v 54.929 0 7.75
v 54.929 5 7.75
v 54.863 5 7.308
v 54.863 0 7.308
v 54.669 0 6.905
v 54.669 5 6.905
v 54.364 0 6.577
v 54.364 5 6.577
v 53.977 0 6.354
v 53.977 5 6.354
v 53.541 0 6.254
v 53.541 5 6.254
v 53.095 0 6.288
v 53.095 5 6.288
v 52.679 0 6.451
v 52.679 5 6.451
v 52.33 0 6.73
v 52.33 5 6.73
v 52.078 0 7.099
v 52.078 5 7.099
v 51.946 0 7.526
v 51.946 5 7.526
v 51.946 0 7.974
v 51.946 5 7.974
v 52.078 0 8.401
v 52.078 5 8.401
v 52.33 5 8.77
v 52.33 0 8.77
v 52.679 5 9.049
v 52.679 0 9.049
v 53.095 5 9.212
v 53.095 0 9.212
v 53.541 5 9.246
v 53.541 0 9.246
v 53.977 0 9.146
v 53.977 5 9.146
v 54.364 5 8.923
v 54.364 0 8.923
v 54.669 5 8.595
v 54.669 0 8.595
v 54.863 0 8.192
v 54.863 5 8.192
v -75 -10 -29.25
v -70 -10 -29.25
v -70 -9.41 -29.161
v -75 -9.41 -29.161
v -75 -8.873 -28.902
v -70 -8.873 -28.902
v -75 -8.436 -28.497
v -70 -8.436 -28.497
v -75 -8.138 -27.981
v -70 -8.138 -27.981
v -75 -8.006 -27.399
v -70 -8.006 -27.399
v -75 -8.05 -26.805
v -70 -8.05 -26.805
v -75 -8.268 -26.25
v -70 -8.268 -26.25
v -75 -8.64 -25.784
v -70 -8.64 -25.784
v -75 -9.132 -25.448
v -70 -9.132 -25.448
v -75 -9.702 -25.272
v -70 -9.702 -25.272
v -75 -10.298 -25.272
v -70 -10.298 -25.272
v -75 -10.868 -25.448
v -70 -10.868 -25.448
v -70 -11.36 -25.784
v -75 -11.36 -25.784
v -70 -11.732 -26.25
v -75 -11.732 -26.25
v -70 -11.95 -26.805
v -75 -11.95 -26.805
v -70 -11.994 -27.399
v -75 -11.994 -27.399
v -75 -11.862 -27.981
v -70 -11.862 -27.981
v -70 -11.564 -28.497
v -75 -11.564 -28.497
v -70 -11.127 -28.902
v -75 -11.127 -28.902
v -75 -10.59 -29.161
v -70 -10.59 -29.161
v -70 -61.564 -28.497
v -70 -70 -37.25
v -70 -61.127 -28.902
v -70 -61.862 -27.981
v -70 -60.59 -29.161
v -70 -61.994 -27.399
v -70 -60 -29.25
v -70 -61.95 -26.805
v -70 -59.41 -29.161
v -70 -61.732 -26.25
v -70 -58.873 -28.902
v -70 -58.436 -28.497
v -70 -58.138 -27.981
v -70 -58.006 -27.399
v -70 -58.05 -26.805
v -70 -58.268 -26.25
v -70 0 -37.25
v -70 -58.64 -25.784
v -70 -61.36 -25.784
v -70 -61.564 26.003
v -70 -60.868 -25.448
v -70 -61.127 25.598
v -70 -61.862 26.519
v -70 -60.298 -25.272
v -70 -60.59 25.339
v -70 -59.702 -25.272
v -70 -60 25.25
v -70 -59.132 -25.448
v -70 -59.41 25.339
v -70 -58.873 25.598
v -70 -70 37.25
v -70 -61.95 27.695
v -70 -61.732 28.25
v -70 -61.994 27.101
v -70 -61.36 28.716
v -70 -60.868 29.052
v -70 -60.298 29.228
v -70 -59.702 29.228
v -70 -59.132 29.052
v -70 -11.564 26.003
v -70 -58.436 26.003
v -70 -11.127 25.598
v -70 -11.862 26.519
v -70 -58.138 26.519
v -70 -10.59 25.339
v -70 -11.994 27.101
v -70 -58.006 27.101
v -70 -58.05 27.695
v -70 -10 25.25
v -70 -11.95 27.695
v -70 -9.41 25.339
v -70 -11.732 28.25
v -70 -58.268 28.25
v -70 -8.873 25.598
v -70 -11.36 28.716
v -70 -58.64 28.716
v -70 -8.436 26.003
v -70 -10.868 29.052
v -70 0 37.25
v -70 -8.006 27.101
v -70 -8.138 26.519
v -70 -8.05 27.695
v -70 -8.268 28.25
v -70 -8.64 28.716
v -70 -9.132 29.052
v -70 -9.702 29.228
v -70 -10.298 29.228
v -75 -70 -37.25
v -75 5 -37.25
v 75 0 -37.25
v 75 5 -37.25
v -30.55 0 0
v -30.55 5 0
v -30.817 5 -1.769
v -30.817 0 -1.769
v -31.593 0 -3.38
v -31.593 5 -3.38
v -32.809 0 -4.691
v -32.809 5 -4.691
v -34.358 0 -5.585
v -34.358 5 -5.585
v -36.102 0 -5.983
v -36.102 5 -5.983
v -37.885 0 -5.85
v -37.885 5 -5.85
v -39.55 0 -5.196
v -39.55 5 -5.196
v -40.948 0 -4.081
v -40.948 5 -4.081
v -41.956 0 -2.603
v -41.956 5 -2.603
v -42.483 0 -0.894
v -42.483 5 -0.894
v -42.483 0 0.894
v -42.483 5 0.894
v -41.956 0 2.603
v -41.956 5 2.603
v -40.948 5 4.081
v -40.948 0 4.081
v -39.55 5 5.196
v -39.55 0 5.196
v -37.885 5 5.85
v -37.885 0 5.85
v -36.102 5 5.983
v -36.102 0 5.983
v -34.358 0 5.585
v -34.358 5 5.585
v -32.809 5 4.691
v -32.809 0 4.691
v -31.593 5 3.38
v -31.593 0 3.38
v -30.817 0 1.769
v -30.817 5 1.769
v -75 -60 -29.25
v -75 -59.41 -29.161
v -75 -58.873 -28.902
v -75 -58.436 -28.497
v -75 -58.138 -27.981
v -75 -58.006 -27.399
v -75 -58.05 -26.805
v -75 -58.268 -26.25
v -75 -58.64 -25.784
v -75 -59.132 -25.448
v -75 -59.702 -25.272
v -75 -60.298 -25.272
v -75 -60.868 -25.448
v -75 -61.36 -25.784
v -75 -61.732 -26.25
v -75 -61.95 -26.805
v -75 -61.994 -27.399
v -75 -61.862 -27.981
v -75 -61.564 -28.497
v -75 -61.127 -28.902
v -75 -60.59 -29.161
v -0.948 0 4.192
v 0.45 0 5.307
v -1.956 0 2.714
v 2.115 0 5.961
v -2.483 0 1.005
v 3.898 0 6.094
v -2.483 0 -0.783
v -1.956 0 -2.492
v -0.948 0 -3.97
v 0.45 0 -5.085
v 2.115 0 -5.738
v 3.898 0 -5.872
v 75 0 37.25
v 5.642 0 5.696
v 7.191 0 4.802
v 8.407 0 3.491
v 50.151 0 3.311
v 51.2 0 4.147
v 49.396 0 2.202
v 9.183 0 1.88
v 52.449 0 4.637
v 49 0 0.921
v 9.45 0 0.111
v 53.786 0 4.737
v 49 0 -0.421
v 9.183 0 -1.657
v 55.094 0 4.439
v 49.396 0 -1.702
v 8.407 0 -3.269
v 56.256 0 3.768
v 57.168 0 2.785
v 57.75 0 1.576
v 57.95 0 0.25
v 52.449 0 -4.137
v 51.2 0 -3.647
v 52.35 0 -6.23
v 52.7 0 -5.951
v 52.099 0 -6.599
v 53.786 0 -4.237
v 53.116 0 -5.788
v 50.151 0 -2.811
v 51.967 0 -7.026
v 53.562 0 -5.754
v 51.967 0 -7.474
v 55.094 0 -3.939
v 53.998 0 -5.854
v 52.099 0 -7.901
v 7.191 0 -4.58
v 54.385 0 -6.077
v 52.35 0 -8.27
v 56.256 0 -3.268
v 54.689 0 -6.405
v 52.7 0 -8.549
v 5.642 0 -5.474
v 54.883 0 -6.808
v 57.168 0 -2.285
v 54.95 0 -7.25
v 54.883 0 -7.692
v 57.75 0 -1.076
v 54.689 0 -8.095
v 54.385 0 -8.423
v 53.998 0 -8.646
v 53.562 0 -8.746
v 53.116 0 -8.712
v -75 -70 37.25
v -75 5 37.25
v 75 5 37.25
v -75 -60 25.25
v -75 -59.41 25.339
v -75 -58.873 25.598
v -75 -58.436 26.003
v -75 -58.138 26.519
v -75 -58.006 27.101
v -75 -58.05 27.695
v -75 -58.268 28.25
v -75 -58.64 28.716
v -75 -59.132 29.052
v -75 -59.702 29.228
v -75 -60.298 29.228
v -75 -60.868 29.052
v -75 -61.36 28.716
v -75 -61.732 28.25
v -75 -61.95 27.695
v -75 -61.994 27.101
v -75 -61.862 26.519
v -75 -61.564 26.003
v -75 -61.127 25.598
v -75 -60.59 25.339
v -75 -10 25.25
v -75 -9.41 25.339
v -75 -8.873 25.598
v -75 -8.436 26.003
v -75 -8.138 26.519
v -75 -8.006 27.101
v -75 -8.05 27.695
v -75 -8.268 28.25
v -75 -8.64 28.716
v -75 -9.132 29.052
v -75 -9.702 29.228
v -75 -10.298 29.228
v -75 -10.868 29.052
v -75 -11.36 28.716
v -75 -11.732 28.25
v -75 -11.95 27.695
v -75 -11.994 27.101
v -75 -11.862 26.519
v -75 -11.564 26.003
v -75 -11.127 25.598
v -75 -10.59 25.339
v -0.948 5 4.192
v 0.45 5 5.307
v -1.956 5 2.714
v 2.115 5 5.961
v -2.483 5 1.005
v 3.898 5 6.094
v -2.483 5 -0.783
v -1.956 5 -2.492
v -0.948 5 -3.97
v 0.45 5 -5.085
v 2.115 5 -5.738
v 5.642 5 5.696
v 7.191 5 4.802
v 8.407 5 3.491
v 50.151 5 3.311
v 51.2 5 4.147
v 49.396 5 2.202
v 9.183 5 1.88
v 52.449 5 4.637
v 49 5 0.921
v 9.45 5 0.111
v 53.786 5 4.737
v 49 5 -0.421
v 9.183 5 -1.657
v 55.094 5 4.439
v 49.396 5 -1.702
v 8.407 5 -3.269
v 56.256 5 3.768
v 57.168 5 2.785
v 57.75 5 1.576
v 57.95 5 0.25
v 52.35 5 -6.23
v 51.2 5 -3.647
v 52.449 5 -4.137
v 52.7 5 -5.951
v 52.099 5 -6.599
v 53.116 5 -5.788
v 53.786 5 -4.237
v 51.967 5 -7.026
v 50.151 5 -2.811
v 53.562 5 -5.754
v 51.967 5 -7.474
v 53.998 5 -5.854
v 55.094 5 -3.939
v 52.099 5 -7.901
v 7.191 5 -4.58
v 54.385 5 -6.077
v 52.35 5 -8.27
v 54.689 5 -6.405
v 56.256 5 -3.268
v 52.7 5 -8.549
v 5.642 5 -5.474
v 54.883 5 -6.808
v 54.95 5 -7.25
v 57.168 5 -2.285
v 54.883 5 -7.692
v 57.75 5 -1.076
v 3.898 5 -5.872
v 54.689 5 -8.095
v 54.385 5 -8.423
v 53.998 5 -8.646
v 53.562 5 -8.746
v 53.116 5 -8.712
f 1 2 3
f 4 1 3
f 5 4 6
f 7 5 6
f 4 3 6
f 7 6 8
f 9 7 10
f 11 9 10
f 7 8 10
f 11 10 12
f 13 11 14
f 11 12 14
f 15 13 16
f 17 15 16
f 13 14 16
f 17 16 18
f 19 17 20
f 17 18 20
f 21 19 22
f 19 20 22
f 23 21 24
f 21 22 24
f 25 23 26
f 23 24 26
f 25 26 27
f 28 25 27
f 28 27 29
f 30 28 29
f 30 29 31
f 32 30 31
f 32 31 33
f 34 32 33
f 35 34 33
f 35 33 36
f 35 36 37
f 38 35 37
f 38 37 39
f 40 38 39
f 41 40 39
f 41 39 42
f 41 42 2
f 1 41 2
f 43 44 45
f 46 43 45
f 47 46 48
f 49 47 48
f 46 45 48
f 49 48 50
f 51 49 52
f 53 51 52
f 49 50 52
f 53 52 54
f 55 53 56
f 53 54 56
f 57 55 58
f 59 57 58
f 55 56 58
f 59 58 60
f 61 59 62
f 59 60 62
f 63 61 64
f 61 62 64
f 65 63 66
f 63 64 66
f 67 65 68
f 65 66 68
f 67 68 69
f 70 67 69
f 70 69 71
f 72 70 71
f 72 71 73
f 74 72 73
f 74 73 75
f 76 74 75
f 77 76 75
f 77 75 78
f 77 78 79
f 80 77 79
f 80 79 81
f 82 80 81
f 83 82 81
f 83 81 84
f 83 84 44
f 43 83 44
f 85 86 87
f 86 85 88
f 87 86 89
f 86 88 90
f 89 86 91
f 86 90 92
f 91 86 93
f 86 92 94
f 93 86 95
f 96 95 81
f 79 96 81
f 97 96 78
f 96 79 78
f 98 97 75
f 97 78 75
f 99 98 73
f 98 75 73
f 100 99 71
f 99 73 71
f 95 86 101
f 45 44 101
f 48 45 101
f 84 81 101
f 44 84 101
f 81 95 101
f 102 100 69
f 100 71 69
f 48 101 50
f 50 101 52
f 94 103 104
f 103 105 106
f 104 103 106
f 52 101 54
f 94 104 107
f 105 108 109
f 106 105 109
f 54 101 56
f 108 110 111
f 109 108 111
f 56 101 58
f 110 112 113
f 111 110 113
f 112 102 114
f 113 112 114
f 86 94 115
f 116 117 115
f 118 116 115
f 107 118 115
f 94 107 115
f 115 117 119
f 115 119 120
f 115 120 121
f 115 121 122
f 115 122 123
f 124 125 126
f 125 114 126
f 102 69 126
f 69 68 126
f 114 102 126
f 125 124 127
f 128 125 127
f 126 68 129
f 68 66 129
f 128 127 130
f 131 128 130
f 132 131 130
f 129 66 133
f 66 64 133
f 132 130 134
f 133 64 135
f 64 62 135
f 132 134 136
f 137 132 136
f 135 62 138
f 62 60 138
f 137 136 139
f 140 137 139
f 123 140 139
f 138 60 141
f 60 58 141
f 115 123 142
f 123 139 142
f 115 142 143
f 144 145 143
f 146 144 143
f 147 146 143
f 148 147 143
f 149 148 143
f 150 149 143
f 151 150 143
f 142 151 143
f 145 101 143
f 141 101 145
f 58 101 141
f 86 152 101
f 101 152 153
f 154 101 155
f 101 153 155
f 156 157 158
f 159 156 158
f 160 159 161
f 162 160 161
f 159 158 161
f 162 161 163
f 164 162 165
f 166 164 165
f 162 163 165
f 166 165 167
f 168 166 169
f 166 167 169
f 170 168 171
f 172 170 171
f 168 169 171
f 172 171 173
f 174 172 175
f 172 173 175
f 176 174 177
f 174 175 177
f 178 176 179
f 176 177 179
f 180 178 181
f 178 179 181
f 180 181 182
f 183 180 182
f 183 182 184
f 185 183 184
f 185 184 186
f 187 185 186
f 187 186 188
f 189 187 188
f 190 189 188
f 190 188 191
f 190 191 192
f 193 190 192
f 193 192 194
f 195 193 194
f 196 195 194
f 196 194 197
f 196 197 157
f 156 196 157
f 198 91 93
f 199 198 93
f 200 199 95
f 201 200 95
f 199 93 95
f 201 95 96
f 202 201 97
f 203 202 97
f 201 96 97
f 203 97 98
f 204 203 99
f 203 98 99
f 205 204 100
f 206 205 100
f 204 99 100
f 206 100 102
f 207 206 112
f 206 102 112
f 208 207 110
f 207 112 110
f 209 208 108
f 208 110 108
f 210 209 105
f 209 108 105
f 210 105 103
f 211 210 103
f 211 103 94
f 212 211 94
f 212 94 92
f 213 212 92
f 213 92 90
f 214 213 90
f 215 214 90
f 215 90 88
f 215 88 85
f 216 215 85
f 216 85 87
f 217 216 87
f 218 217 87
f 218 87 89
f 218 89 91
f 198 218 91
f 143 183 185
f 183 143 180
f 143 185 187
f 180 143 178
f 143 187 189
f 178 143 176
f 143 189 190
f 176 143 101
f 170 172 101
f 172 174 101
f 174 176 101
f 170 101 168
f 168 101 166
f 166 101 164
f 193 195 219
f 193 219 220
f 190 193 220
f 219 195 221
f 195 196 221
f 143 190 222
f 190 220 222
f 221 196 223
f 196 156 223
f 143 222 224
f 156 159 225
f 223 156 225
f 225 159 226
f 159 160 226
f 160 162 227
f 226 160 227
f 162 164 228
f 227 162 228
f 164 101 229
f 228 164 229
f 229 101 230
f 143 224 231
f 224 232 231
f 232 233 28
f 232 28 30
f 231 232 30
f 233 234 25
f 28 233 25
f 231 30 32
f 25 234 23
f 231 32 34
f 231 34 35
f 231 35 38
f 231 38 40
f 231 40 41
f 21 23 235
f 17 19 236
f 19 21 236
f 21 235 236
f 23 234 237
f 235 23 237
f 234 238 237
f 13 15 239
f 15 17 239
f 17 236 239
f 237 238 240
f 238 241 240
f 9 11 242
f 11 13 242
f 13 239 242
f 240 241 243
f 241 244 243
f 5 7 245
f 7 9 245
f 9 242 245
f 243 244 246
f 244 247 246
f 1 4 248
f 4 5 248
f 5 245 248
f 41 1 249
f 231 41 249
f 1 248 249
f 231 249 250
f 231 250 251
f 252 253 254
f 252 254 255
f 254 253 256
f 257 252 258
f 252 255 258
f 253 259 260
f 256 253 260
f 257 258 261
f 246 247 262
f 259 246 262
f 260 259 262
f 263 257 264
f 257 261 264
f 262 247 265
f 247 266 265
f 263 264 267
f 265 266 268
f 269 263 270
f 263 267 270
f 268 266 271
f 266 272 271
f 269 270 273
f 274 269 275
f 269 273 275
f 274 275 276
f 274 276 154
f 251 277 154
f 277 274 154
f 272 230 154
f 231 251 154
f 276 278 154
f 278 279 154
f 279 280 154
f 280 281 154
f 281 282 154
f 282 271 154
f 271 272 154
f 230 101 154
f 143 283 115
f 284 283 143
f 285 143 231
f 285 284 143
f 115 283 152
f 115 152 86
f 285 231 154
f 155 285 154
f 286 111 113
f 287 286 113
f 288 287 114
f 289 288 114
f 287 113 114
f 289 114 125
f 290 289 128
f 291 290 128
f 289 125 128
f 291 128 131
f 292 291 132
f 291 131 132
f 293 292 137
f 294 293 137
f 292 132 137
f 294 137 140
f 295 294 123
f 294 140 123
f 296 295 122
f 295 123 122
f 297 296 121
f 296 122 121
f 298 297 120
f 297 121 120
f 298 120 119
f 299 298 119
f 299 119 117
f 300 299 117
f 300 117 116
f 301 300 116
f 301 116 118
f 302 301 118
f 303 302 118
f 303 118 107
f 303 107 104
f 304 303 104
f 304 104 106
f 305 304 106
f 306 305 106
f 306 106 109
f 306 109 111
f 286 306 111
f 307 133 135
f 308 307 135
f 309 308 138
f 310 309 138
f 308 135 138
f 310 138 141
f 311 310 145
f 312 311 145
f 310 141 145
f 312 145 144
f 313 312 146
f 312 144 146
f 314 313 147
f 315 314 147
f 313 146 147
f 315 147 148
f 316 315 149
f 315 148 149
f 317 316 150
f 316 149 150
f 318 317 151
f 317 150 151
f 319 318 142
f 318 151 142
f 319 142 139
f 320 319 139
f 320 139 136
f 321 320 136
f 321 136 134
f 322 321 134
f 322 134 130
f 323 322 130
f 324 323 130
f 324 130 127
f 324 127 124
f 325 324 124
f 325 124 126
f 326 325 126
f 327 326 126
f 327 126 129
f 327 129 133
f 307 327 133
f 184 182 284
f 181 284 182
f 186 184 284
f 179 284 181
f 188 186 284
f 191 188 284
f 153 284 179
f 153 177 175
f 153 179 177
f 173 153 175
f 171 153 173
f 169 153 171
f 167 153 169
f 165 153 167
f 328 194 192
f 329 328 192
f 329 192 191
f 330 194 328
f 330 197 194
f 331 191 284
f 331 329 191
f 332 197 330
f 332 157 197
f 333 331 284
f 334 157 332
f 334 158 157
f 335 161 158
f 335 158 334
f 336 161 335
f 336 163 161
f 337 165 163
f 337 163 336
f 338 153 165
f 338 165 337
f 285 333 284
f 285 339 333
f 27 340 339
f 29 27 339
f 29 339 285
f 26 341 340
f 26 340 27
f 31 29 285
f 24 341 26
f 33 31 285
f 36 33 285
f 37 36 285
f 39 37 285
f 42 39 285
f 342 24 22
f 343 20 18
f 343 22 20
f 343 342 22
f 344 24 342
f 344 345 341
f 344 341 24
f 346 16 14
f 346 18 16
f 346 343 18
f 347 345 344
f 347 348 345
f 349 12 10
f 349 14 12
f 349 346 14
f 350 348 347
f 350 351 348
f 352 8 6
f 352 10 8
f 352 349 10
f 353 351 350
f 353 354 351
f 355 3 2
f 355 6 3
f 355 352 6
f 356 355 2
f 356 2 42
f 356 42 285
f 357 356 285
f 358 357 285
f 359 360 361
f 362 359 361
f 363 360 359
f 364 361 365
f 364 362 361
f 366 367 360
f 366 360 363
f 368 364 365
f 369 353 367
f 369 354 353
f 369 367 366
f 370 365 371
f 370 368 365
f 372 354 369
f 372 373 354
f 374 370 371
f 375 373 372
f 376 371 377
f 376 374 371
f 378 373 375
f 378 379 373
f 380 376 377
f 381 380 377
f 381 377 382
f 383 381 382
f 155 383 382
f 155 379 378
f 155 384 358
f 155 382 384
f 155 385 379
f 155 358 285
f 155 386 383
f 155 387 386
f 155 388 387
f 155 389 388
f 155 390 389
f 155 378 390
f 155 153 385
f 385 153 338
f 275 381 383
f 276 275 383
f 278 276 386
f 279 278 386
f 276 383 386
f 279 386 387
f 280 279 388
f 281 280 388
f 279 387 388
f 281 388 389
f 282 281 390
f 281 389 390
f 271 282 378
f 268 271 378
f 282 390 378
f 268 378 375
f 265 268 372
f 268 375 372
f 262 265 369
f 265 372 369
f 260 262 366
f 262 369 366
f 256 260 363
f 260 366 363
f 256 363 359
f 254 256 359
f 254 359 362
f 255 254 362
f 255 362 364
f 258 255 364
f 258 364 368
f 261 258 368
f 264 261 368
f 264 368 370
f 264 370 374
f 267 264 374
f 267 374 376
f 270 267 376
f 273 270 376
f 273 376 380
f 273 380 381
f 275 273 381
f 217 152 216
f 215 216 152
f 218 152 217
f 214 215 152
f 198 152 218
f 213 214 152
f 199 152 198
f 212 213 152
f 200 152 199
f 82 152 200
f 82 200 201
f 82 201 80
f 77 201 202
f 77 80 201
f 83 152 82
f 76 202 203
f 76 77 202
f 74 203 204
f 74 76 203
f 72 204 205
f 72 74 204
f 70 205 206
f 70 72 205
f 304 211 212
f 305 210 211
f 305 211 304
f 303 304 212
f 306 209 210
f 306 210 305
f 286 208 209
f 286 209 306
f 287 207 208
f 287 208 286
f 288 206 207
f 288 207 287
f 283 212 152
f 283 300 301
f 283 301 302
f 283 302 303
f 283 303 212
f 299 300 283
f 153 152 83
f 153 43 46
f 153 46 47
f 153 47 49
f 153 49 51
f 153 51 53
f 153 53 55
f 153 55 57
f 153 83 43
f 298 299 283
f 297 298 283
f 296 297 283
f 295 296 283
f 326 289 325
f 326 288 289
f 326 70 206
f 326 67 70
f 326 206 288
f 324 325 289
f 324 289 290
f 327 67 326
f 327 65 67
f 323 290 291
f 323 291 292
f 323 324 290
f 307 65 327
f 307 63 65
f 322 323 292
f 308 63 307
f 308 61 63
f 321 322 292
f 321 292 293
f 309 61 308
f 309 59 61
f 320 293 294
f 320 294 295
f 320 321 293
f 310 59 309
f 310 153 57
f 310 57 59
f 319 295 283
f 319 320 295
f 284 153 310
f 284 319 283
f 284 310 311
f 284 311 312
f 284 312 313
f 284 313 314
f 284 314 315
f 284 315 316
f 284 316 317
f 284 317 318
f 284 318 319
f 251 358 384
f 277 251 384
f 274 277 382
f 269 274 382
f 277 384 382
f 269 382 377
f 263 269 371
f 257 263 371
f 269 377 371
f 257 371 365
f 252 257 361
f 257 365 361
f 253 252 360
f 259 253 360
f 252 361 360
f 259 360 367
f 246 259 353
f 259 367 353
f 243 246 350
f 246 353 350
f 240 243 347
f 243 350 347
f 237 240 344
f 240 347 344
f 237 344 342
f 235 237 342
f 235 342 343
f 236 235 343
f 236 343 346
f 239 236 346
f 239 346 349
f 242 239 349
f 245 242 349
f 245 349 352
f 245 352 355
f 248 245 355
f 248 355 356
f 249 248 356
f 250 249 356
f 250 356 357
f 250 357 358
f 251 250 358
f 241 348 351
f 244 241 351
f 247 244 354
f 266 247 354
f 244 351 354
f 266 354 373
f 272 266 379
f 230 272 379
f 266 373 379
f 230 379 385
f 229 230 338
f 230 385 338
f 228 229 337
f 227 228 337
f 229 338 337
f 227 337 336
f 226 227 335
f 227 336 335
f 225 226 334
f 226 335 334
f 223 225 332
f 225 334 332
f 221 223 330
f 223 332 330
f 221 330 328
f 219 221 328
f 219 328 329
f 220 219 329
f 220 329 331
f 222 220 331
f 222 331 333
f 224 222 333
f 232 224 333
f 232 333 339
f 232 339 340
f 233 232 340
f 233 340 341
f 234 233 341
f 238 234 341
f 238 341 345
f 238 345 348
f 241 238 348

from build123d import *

# Parameters (mm, degrees)
CROQUIS1_W              = 150
CROQUIS1_H              = 74.5
SALIENTE_EXTRUIR1_DEPTH = 5
CROQUIS2_W              = 5
CROQUIS2_H              = 74.5
SALIENTE_EXTRUIR2_DEPTH = 70
CROQUIS3_R              = 2
CORTAR_EXTRUIR1_DEPTH   = 70
CROQUIS4_R              = 6
CROQUIS4_R_2            = 4.5
CROQUIS4_R_3            = 1.5
CORTAR_EXTRUIR2_DEPTH   = 70


with BuildPart() as part:
    # Croquis1 → Saliente-Extruir1 (new body)
    with BuildSketch(Plane(origin=(0, 0, 0), x_dir=(1, 0, 0), z_dir=(0, 1, 0))):
        Rectangle(CROQUIS1_W, CROQUIS1_H)
    extrude(amount=SALIENTE_EXTRUIR1_DEPTH)

    # Croquis2 → Saliente-Extruir2 (add)
    with BuildSketch(Plane.XZ):
        with Locations((-72.5, 0)):
            Rectangle(CROQUIS2_W, CROQUIS2_H)
    extrude(amount=SALIENTE_EXTRUIR2_DEPTH)

    # Croquis3 → Cortar-Extruir1 (cut)
    with BuildSketch(Plane(origin=(-70, 0, 0), x_dir=(0, 0, -1), z_dir=(1, 0, 0))):
        with Locations((-27.25, -10)):
            Circle(CROQUIS3_R)
        with Locations((27.25, -10)):
            Circle(CROQUIS3_R)
        with Locations((27.25, -60)):
            Circle(CROQUIS3_R)
        with Locations((-27.25, -60)):
            Circle(CROQUIS3_R)
    extrude(amount=-CORTAR_EXTRUIR1_DEPTH, mode=Mode.SUBTRACT)

    # Croquis4 → Cortar-Extruir2 (cut)
    with BuildSketch(Plane(origin=(0, 5, 0), x_dir=(1, 0, 0), z_dir=(0, 1, 0))):
        with Locations((-36.55, 0)):
            Circle(CROQUIS4_R)
        with Locations((53.45, -0.25)):
            Circle(CROQUIS4_R_2)
        with Locations((53.45, 7.25)):
            Circle(CROQUIS4_R_3)
        with Locations((53.429166747, -7.749971065)):
            Circle(CROQUIS4_R_3)
        with Locations((3.44984568, -0.111110682)):
            Circle(CROQUIS4_R)
    extrude(amount=-CORTAR_EXTRUIR2_DEPTH, mode=Mode.SUBTRACT)


solid = part.part
